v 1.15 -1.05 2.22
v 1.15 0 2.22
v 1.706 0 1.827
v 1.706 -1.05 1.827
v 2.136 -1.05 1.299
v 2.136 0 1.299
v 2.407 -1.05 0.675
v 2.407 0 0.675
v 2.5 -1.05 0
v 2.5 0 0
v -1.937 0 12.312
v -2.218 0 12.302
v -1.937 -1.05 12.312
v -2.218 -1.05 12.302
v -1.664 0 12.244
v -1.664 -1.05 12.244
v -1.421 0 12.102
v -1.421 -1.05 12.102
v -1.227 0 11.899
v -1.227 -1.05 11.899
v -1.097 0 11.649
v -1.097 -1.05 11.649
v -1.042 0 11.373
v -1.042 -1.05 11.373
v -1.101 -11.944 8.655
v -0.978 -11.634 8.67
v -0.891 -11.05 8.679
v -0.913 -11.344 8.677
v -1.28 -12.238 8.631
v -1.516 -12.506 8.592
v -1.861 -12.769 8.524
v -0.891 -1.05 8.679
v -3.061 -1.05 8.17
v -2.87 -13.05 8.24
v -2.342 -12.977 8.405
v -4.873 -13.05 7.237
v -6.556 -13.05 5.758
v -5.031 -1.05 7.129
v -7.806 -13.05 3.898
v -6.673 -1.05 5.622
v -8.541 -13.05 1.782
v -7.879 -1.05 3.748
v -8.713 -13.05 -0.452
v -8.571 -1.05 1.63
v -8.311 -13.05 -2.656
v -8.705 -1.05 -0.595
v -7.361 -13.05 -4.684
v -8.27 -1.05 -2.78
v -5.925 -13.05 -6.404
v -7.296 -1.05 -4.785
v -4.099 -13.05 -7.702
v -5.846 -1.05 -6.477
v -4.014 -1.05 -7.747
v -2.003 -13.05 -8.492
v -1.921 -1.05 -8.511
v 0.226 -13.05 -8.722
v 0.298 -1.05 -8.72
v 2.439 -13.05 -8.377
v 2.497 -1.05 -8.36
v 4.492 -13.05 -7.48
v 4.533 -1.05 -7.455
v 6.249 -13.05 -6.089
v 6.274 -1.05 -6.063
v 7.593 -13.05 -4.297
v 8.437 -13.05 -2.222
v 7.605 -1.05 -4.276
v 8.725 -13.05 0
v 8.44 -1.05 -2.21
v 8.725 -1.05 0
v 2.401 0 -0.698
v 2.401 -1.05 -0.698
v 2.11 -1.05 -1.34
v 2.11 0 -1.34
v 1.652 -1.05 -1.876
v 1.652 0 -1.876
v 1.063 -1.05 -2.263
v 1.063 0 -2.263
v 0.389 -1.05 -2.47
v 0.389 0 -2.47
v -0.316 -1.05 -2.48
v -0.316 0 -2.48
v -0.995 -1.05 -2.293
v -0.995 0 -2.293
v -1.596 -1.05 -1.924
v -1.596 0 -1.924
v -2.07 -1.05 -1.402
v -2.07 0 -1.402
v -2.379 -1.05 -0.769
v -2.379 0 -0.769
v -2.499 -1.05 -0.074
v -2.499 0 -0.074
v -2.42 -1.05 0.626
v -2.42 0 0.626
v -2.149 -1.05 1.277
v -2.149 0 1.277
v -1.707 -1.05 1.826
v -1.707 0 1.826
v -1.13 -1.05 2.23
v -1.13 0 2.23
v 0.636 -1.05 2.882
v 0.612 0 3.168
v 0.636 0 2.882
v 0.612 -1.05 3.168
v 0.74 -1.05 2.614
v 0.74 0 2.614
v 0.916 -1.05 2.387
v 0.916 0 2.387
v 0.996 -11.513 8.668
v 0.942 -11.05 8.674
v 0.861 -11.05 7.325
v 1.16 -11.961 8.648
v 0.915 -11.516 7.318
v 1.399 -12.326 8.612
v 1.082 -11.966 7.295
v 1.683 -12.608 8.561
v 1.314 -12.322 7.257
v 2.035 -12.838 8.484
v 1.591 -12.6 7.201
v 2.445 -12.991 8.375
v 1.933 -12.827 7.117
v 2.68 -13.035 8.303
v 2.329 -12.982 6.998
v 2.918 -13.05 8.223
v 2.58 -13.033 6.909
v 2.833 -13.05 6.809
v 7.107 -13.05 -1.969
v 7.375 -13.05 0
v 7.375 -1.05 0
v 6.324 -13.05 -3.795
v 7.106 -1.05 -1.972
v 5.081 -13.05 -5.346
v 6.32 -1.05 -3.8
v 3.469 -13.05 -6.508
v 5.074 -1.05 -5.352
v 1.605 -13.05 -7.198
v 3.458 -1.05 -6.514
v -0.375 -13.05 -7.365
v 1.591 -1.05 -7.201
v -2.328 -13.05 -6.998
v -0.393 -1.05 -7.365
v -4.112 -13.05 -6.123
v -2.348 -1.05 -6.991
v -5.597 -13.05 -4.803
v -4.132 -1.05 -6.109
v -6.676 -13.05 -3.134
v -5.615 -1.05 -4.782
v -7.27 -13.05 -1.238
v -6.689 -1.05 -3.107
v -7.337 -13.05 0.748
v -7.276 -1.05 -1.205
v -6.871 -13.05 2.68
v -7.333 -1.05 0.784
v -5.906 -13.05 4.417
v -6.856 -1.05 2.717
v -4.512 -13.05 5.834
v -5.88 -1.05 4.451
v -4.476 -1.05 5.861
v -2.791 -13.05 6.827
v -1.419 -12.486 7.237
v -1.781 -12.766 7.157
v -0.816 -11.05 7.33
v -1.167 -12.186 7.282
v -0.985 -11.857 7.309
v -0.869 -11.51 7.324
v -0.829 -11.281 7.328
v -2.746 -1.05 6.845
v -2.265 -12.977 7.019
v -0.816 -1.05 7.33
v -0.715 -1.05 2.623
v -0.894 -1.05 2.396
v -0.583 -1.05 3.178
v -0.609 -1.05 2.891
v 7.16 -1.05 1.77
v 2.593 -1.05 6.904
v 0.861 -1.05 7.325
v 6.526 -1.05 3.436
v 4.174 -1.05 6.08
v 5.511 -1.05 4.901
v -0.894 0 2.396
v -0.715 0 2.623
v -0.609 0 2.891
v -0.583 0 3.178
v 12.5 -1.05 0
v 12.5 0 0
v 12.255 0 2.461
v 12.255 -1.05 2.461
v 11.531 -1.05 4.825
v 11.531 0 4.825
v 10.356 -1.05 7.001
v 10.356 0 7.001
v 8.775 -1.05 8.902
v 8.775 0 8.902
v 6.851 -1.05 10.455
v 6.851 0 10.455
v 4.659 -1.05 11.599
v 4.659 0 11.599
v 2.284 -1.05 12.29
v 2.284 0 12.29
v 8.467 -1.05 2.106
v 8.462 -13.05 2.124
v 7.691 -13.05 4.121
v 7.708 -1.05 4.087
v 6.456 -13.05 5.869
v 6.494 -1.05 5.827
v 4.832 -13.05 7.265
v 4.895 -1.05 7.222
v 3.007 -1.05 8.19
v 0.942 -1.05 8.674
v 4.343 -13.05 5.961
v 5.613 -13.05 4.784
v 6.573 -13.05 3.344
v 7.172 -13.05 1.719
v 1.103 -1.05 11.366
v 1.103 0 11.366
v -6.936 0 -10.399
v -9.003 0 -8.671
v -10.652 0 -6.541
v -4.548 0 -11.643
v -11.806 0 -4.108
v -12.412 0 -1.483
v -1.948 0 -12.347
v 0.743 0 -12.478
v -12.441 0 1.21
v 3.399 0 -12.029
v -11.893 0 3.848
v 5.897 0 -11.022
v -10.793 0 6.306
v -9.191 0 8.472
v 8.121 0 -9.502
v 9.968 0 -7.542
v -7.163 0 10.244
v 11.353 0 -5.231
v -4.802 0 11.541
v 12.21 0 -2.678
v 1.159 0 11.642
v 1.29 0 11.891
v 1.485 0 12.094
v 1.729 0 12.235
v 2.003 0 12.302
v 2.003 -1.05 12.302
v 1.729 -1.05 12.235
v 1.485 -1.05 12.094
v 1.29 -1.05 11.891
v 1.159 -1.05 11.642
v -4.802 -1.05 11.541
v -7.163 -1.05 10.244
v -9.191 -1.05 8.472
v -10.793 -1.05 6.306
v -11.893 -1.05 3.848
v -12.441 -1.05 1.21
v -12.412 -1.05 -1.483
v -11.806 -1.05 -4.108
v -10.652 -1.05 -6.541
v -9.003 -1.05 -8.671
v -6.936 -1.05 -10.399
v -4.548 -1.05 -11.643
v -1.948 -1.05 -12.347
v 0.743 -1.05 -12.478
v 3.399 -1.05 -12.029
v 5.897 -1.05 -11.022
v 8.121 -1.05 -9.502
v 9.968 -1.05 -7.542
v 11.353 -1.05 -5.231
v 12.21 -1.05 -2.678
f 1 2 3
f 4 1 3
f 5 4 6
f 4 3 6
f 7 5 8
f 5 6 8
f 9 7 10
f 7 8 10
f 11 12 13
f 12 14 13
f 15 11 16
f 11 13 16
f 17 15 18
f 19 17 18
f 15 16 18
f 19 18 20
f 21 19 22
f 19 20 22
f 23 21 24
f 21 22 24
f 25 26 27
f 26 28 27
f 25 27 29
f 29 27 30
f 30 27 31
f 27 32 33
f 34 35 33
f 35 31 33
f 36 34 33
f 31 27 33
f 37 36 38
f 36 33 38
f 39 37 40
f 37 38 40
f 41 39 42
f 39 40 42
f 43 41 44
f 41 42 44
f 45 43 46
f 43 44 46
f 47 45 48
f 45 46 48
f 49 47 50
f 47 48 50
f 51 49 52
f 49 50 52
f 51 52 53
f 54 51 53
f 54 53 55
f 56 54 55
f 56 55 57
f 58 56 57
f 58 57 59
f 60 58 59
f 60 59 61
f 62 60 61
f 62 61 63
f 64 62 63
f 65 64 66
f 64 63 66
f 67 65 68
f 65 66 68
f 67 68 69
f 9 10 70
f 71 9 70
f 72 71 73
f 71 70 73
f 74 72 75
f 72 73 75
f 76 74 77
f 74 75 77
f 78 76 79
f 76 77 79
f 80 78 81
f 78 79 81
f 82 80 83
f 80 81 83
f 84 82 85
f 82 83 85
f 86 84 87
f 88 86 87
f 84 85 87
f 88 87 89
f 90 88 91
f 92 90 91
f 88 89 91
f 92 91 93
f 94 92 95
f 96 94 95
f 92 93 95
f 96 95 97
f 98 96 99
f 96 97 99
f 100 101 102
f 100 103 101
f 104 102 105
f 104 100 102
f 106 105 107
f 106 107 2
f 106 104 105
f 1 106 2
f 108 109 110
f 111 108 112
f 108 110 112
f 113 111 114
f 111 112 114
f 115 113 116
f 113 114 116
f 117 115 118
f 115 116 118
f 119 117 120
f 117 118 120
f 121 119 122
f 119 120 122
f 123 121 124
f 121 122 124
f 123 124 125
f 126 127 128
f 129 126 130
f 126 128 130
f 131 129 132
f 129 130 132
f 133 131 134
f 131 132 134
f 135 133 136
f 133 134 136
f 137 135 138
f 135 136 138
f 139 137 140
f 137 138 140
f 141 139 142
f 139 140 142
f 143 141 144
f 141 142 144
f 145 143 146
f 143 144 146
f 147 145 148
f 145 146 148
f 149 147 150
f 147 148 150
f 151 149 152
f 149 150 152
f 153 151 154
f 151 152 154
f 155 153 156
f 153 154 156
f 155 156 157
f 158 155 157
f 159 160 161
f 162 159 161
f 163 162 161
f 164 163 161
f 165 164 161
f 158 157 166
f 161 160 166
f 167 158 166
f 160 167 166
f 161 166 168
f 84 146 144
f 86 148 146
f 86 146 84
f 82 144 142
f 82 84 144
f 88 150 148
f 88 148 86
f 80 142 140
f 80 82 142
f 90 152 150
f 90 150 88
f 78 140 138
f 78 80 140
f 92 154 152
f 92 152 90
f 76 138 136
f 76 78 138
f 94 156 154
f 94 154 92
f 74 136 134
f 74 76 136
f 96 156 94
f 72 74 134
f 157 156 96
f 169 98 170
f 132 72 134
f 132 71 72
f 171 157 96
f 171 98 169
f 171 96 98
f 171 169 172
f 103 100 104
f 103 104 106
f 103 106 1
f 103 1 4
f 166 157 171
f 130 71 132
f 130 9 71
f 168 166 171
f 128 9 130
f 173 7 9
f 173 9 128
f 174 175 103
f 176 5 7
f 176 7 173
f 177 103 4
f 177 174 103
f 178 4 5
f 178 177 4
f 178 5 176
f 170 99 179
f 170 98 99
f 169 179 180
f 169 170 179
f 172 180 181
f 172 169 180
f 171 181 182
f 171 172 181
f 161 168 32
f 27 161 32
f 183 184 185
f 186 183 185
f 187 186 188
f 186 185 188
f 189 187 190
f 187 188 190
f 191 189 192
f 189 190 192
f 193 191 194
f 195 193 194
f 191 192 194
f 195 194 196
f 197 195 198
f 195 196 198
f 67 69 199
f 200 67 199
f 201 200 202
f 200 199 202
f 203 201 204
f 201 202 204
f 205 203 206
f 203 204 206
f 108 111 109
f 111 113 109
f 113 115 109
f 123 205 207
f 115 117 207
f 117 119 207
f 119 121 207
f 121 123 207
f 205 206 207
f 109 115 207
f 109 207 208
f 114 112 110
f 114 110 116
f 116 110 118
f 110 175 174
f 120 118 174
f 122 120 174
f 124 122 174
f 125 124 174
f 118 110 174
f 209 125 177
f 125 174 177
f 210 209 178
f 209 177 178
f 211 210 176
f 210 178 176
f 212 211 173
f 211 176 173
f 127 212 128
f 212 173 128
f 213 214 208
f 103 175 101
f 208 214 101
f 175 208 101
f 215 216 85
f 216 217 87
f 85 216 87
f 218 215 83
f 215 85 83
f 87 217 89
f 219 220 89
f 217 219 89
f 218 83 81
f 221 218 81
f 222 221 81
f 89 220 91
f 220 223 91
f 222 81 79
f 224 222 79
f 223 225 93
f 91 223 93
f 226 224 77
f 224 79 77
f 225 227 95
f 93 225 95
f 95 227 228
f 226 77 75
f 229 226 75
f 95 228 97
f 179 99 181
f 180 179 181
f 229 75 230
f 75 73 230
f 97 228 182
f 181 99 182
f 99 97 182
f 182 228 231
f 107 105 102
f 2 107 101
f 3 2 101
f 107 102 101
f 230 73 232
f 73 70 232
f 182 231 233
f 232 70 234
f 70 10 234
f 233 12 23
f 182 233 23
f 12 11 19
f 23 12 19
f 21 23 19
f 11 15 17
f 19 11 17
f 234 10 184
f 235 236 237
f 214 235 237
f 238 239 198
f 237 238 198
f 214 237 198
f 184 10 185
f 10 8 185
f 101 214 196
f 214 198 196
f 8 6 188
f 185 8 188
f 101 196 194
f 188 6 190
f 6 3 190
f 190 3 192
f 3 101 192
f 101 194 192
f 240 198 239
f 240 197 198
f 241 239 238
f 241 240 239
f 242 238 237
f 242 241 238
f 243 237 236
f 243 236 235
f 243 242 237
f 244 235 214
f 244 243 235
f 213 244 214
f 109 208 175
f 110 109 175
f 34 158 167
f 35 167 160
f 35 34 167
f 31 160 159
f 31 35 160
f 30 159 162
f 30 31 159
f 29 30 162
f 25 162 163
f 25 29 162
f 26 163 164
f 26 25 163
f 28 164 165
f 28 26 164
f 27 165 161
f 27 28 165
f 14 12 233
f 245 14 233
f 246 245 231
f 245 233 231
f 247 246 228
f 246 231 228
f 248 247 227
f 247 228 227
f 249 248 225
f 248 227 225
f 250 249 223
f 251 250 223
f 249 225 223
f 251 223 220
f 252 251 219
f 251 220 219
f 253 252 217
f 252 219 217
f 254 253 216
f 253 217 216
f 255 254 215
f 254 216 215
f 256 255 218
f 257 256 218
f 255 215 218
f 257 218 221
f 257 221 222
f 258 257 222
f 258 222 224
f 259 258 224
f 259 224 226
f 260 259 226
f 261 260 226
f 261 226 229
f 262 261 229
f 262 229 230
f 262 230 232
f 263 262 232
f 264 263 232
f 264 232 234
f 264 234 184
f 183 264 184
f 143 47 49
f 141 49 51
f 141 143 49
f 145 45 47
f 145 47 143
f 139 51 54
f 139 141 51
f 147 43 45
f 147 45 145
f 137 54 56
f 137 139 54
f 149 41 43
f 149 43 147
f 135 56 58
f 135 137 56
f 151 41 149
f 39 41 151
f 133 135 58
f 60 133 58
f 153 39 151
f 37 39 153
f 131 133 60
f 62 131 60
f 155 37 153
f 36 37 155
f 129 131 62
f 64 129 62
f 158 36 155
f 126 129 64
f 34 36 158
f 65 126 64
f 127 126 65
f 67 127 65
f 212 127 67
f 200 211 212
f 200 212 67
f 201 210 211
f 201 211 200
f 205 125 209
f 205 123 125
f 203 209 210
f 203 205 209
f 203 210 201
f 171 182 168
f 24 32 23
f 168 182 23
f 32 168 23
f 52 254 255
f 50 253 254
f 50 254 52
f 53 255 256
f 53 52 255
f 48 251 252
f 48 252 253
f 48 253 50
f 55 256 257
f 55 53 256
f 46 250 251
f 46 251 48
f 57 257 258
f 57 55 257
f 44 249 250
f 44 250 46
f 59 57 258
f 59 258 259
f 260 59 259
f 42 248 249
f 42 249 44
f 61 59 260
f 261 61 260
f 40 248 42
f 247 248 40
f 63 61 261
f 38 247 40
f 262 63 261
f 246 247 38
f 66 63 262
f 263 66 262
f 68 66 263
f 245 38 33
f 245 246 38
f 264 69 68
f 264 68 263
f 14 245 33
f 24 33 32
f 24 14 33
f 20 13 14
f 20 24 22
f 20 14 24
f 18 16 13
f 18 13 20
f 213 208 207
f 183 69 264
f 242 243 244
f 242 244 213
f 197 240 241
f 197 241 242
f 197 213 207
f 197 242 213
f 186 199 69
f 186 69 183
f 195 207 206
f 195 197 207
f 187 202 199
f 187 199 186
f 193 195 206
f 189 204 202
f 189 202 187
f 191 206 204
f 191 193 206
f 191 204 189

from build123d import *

# Parameters (mm, degrees)
F1_DEPTH = 1.05
F2_R     = 1
F4_DEPTH = 12
F5_R     = 2


with BuildPart() as f1:
    # F0 (on Front) → F1 (new body)
    with BuildSketch(Plane.XZ):
        with BuildLine():
            ThreePointArc((-1.102396, 12.451294), (-8.440085, -9.220356), (12.5, 0))
            ThreePointArc((12.5, 0), (9.242496, 8.415834), (1.167797, 12.44533))
            Line((1.167797, 12.44533), (0.567577, 2.434719))
            ThreePointArc((0.567577, 2.434719), (1.958181, 1.554197), (2.5, 0))
            ThreePointArc((2.5, 0), (-1.5644, -1.950039), (-0.542121, 2.440513))
            Line((-0.542121, 2.440513), (-1.102396, 12.451294))
        make_face()
    extrude(amount=F1_DEPTH)

    # F2
    f2_edges = [f1.edges().sort_by_distance(p)[0] for p in [
        (-1.102396, -0.525, 12.451294),
        (1.167797, -0.525, 12.44533),
        (-0.542121, -0.525, 2.440513),
        (0.567577, -0.525, 2.434719),
    ]]
    fillet(f2_edges, radius=F2_R)

    # F3 (on face) → F4 (join)
    with BuildSketch(Plane.XZ.offset(1.05)):
        with BuildLine():
            ThreePointArc((0.860766, 7.324596), (5.510843, 4.901146), (7.375, 0))
            ThreePointArc((7.375, 0), (-4.918049, -5.495764), (-0.815757, 7.329745))
            Line((-0.815757, 7.329745), (-0.891291, 8.679356))
            ThreePointArc((-0.891291, 8.679356), (-5.845901, -6.476965), (8.725, 0))
            ThreePointArc((8.725, 0), (6.493911, 5.82707), (0.941676, 8.674034))
            Line((0.941676, 8.674034), (0.860766, 7.324596))
        make_face()
    extrude(amount=F4_DEPTH)

    # F5
    f5_edges = [f1.edges().sort_by_distance(p)[0] for p in [
        (-0.853524, -13.05, 8.004551),
        (0.901221, -13.05, 7.999315),
    ]]
    fillet(f5_edges, radius=F5_R)


solid = f1.part
